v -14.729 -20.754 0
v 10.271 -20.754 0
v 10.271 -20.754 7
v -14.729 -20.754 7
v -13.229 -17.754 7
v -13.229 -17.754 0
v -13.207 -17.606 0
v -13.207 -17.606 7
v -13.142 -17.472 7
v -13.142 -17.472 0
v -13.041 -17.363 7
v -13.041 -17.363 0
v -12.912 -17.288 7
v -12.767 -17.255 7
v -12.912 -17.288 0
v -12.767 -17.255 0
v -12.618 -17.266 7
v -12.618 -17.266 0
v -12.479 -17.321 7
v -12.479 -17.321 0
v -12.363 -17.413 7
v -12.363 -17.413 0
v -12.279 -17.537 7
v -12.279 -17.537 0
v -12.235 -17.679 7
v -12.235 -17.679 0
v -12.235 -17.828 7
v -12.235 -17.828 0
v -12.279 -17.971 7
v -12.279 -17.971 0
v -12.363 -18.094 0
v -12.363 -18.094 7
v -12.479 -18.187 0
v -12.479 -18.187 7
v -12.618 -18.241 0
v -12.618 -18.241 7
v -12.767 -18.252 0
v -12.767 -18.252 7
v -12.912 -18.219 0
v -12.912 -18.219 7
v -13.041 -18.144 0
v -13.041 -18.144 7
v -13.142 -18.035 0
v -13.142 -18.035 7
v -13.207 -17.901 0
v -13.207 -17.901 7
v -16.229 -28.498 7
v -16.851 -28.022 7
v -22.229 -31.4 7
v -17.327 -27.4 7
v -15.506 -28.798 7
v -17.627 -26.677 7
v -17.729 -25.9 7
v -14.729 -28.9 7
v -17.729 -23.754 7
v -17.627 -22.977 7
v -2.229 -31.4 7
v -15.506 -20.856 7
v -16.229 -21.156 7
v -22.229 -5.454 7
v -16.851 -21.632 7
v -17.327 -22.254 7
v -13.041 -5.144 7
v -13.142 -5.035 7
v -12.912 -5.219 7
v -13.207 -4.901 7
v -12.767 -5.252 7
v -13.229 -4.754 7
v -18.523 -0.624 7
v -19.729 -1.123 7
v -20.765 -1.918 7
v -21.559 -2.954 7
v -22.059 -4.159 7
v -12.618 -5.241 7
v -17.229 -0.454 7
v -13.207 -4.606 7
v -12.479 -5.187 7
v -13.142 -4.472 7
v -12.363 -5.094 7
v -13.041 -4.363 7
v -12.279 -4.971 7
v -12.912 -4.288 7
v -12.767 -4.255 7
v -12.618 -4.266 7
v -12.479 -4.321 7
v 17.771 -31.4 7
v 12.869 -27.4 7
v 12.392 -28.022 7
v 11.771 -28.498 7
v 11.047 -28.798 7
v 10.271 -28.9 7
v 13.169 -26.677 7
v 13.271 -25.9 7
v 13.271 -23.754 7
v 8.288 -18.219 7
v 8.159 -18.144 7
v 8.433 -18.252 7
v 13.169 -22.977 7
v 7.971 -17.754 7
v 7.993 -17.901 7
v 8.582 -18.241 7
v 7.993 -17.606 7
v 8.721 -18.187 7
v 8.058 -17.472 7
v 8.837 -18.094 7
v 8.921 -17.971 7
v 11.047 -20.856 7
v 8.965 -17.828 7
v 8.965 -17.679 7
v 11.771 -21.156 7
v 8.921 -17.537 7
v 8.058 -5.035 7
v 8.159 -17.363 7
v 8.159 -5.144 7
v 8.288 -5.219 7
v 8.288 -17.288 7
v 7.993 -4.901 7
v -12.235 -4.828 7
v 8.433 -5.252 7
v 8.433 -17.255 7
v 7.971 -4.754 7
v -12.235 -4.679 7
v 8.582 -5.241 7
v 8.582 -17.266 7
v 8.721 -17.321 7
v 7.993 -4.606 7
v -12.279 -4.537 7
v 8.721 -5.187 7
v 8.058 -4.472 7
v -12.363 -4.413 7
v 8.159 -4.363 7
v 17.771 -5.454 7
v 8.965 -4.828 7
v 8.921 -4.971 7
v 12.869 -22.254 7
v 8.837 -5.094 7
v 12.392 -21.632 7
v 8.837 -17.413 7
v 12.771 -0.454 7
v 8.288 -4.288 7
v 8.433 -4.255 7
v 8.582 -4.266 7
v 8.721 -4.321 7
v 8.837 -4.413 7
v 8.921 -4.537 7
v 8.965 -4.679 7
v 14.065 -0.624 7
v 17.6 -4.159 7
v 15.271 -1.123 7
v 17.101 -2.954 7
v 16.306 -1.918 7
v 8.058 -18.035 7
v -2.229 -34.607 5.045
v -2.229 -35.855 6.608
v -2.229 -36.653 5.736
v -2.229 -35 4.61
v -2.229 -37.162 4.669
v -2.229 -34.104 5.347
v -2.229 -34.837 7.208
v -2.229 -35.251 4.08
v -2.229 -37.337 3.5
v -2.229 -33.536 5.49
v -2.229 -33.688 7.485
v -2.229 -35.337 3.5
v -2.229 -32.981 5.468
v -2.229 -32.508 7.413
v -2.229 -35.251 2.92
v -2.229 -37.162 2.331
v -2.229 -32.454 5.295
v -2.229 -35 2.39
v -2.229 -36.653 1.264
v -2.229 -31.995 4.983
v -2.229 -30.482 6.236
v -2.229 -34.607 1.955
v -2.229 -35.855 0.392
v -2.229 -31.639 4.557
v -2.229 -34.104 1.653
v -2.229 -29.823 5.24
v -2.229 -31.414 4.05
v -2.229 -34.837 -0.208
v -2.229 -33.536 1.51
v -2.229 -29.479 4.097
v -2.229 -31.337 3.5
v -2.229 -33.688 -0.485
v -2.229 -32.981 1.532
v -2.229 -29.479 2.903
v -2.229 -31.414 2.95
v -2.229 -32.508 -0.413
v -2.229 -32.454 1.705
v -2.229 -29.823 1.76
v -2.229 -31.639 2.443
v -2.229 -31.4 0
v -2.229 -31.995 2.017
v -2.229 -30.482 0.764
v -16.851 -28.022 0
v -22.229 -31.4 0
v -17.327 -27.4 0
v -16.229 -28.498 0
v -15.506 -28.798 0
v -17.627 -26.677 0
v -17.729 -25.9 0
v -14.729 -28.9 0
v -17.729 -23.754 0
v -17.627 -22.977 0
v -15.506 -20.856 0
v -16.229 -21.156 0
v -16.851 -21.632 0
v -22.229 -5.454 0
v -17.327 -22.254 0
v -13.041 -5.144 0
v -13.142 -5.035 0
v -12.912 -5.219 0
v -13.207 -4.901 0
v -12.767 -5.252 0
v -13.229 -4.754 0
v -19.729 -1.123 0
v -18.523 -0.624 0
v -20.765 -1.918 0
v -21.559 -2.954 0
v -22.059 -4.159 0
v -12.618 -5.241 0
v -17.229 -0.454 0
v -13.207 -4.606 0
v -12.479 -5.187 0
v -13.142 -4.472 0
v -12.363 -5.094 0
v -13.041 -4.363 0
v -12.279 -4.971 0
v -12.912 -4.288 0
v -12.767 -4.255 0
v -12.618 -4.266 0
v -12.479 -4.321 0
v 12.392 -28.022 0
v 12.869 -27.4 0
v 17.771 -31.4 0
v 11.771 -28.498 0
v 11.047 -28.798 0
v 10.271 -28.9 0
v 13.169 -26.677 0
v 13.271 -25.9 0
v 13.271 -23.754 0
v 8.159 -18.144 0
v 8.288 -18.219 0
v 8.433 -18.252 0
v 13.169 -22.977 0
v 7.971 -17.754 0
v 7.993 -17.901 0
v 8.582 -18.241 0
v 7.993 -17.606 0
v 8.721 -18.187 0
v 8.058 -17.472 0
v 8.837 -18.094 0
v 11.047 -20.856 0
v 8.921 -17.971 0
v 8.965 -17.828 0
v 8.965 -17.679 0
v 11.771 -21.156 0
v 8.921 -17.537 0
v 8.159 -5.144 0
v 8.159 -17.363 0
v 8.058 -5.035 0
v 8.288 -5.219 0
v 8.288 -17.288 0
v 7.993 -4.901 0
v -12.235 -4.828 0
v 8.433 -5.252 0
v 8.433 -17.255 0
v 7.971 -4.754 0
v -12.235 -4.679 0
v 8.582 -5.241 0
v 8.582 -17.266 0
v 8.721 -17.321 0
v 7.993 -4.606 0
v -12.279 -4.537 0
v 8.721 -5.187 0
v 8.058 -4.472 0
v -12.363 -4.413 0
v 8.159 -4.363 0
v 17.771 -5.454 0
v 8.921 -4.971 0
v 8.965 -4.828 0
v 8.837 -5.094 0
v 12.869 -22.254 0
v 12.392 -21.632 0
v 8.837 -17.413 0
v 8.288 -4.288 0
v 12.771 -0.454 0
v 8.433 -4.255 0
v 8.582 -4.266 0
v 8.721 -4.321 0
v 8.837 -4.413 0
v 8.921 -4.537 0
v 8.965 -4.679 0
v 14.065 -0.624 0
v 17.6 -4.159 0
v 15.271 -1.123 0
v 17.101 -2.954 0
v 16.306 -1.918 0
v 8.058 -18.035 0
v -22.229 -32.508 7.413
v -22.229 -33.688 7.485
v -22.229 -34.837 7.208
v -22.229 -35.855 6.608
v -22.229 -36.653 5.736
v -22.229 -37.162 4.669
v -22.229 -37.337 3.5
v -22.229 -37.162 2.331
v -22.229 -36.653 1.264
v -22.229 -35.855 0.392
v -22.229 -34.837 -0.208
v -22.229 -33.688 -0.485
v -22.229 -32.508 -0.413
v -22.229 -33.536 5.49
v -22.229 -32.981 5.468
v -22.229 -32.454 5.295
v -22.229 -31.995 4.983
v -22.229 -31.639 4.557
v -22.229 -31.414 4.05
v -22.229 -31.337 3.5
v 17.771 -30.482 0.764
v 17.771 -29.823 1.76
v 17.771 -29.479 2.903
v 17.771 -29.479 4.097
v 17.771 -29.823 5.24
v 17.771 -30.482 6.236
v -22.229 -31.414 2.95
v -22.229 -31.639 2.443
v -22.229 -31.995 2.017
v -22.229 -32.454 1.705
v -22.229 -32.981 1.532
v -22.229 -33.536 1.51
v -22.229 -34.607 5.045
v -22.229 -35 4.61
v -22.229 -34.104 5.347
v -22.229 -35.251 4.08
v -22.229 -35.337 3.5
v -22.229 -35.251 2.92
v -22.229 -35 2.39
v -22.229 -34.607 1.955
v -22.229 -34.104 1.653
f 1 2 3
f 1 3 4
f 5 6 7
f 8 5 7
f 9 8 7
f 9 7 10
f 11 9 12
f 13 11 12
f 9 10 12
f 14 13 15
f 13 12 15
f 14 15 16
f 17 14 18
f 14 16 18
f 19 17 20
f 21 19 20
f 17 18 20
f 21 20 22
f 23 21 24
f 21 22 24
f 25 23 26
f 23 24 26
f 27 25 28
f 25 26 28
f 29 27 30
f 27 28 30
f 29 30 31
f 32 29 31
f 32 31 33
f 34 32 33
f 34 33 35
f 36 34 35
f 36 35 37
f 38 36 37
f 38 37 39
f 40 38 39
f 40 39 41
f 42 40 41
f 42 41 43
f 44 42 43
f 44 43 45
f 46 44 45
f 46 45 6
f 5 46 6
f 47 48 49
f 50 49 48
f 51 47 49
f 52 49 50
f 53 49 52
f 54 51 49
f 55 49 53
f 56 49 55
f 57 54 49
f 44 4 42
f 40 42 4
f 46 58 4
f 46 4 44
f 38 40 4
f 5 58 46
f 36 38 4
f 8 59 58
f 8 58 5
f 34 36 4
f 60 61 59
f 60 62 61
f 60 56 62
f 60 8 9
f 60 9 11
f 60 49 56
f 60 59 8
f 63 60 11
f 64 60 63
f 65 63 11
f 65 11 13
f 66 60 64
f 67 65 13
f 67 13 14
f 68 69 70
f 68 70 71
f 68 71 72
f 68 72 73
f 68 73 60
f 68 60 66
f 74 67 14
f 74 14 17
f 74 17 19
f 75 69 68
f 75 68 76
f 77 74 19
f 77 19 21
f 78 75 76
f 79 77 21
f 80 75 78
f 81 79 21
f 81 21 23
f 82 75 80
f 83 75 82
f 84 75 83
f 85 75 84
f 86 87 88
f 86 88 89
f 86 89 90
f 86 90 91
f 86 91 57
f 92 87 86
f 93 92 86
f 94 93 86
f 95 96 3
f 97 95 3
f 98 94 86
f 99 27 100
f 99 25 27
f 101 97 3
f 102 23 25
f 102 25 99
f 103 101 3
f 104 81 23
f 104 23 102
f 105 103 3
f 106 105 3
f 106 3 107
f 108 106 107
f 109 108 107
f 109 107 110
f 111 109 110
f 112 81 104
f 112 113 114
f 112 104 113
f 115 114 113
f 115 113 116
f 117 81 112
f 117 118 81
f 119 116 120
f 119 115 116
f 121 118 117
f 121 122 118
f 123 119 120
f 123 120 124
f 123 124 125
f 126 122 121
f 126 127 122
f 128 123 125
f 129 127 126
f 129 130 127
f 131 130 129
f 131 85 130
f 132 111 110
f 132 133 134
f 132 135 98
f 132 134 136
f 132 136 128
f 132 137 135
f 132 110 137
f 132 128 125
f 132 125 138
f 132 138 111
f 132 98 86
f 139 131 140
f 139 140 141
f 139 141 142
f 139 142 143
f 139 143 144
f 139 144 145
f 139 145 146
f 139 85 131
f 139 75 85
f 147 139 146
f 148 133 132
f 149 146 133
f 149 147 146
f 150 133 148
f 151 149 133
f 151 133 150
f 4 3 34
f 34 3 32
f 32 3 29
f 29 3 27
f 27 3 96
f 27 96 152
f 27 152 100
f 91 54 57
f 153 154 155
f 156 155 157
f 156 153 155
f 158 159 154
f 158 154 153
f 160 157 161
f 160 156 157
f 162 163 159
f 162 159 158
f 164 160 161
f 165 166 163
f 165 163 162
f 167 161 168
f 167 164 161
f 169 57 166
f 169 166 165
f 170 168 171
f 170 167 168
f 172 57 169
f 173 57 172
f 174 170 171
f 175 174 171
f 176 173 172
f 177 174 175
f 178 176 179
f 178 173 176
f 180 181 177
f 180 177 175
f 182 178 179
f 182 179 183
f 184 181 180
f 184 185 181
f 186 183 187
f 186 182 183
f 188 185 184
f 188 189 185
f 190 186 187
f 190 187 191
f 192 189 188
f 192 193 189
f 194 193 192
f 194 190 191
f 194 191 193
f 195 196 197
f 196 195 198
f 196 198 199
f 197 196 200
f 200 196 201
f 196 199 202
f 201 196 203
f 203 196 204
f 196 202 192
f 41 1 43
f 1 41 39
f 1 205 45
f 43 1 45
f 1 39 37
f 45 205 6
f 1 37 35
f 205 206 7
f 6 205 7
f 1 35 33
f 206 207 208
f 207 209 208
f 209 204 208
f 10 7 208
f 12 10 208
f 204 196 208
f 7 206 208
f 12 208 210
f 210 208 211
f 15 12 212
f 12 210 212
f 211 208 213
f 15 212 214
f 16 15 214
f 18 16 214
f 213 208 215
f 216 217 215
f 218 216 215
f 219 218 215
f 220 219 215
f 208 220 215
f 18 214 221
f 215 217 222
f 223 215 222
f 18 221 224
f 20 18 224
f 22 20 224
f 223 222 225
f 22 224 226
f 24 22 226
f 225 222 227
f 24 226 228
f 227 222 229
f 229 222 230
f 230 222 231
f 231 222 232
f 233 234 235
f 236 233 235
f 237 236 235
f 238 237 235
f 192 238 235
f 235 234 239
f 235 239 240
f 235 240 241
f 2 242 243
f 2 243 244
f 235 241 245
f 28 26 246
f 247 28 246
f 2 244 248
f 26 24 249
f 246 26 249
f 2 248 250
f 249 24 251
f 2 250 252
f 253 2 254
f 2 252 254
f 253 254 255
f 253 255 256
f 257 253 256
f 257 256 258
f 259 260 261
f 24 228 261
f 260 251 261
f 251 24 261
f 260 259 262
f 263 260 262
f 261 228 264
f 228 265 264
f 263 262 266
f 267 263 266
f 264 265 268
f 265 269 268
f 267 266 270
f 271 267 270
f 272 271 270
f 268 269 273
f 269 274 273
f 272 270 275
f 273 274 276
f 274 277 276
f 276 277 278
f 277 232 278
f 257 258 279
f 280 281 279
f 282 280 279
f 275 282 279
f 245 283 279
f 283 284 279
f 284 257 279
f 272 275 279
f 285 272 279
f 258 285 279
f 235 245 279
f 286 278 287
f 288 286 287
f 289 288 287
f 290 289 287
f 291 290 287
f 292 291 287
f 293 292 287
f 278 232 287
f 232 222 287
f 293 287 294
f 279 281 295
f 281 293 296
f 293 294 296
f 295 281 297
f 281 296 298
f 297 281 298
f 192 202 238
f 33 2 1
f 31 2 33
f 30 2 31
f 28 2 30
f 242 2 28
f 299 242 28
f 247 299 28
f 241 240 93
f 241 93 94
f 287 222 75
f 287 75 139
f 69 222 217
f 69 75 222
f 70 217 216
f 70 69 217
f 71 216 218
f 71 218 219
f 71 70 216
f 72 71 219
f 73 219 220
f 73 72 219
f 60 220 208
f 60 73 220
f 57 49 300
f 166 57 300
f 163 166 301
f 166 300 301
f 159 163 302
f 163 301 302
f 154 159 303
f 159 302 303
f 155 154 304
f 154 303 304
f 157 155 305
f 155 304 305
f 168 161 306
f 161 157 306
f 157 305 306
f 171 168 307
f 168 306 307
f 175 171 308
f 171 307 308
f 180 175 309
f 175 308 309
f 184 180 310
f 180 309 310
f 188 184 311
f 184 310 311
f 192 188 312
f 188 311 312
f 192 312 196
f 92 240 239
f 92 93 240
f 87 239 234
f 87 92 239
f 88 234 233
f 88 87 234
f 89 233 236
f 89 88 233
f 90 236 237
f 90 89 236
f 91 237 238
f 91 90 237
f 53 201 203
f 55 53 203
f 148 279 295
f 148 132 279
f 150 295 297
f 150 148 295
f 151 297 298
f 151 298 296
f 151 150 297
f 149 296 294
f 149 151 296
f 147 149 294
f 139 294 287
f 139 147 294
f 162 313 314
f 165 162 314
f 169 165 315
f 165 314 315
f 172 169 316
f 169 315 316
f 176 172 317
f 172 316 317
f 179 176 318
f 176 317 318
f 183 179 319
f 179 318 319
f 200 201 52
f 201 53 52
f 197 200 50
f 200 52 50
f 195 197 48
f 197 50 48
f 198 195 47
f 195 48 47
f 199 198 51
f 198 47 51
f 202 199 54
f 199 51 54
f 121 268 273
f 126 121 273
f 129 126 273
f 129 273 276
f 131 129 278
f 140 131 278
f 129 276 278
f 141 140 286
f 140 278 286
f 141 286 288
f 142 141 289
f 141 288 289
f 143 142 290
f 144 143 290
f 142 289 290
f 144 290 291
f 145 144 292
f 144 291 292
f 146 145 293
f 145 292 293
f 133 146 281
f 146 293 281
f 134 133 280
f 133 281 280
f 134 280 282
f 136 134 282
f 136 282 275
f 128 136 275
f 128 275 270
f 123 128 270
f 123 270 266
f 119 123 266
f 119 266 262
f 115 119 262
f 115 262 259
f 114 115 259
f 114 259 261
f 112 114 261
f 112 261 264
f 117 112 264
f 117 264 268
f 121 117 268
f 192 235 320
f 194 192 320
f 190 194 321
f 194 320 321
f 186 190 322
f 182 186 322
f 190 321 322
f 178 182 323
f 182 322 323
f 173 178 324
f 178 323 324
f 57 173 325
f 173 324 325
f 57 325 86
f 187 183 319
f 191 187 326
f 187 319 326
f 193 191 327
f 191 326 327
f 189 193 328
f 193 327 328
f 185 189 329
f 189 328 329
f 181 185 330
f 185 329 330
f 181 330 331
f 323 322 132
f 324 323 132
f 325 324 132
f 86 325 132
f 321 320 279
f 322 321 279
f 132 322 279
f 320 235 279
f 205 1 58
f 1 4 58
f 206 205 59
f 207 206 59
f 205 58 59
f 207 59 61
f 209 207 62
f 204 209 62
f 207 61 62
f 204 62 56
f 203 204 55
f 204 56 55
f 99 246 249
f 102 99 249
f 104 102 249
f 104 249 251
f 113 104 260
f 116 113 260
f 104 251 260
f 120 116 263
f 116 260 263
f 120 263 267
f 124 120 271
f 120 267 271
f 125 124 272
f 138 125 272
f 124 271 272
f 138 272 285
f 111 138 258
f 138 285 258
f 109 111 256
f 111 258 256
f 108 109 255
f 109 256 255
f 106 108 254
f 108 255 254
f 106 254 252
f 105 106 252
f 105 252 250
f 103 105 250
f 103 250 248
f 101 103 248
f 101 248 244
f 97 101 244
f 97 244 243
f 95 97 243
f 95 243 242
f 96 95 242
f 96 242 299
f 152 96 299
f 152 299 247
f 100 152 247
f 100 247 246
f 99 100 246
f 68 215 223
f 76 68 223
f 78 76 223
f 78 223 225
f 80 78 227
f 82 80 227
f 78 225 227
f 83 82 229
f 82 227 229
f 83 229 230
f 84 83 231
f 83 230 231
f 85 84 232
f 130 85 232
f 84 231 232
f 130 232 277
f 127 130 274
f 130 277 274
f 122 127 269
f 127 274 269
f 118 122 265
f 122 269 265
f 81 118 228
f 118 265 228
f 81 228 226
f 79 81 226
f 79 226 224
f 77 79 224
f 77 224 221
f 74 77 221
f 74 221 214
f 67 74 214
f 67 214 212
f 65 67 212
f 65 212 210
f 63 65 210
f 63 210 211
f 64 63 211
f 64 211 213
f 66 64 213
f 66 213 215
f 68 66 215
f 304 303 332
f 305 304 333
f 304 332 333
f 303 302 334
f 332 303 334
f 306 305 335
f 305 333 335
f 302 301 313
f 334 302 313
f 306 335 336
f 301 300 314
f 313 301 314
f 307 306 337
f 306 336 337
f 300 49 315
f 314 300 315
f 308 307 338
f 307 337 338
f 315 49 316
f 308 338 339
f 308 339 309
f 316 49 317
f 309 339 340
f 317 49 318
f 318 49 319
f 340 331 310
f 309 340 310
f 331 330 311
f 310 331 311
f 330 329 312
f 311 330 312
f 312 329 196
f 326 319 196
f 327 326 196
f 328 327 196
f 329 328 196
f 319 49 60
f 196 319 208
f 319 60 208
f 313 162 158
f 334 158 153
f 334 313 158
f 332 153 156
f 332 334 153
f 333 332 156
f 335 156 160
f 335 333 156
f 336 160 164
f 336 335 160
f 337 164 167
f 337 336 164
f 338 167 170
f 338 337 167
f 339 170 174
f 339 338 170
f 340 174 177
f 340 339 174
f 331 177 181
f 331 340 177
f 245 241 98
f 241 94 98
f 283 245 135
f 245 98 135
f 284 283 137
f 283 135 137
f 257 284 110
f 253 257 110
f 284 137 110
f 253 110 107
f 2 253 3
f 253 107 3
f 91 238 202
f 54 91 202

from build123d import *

# Parameters (mm, degrees)
SKETCH1_W                = 40
SKETCH1_H                = 33.082043622
BOSS_EXTRUDE1_DEPTH      = 7
SKETCH2_R                = 4.1
CUT_EXTRUDE1_DEPTH       = 20
BOSS_EXTRUDE2_DEPTH      = 11
BOSS_EXTRUDE2_DEPTH_BACK = 9
SKETCH3_R                = 4
SKETCH3_R_2              = 2
FILLET1_R                = 5
SKETCH4_R                = 0.5
SKETCH4_W                = 31
SKETCH4_H                = 8.146627971
CUT_EXTRUDE2_DEPTH       = 45.095541639
FILLET2_R                = 3
SKETCH5_R                = 2
CUT_EXTRUDE3_DEPTH       = 56.229329833


with BuildPart() as part:
    # Sketch1 → Boss-Extrude1 (new body)
    with BuildSketch(Plane.XY):
        with Locations((-2.229213179, -16.994598242)):
            Rectangle(SKETCH1_W, SKETCH1_H)
    extrude(amount=BOSS_EXTRUDE1_DEPTH)

    # Sketch2 → Cut-Extrude1 (cut)
    with BuildSketch(Plane(origin=(17.770786821, 0, 0), x_dir=(0, 0, -1), z_dir=(1, 0, 0))):
        with Locations((-3.5, -33.535620053)):
            Circle(SKETCH2_R)
    extrude(amount=-CUT_EXTRUDE1_DEPTH, mode=Mode.SUBTRACT)

    # Sketch3 → Boss-Extrude2 (add, two sides: drawn at the far end of the back side and taken through both)
    with BuildSketch(Plane(origin=(-13.229213179, 0, 0), x_dir=(0, 0, -1), z_dir=(1, 0, 0)).offset(-BOSS_EXTRUDE2_DEPTH_BACK)):
        with Locations((-3.5, -33.336696075)):
            Circle(SKETCH3_R)
        with Locations((-3.5, -33.336696075)):
            Circle(SKETCH3_R_2, mode=Mode.SUBTRACT)
    extrude(amount=BOSS_EXTRUDE2_DEPTH + BOSS_EXTRUDE2_DEPTH_BACK)

    # Fillet1
    fillet1_edges = [part.edges().sort_by_distance(p)[0] for p in [
        (-22.229213179, -0.453576431, 3.5),
        (17.770786821, -0.453576431, 3.5),
    ]]
    fillet(fillet1_edges, radius=FILLET1_R)

    # Sketch4 → Cut-Extrude2 (cut, through all)
    with BuildSketch(Plane(origin=(0, 0, 0), x_dir=(-1, 0, 0), z_dir=(0, 0, -1))):
        with Locations((-8.470786821, -4.753576431)):
            Circle(SKETCH4_R)
        with Locations((12.729213179, -4.753576431)):
            Circle(SKETCH4_R)
        with Locations((12.729213179, -17.753576431)):
            Circle(SKETCH4_R)
        with Locations((-8.470786821, -17.753576431)):
            Circle(SKETCH4_R)
        with Locations((2.229213179, -24.826890417)):
            Rectangle(SKETCH4_W, SKETCH4_H)
    extrude(amount=-CUT_EXTRUDE2_DEPTH, mode=Mode.SUBTRACT)

    # Fillet2
    fillet2_edges = [part.edges().sort_by_distance(p)[0] for p in [
        (-17.729213179, -20.753576431, 3.5),
        (-17.729213179, -28.900204402, 3.5),
        (13.270786821, -28.900204402, 3.5),
        (13.270786821, -20.753576431, 3.5),
    ]]
    fillet(fillet2_edges, radius=FILLET2_R)

    # Sketch5 → Cut-Extrude3 (cut, through all)
    with BuildSketch(Plane.ZY.offset(22.229213179)):
        with Locations(Location((3.5, -33.336696075, 0), (0, 0, 90))):
            Circle(SKETCH5_R)
    extrude(amount=-CUT_EXTRUDE3_DEPTH, mode=Mode.SUBTRACT)


solid = part.part
